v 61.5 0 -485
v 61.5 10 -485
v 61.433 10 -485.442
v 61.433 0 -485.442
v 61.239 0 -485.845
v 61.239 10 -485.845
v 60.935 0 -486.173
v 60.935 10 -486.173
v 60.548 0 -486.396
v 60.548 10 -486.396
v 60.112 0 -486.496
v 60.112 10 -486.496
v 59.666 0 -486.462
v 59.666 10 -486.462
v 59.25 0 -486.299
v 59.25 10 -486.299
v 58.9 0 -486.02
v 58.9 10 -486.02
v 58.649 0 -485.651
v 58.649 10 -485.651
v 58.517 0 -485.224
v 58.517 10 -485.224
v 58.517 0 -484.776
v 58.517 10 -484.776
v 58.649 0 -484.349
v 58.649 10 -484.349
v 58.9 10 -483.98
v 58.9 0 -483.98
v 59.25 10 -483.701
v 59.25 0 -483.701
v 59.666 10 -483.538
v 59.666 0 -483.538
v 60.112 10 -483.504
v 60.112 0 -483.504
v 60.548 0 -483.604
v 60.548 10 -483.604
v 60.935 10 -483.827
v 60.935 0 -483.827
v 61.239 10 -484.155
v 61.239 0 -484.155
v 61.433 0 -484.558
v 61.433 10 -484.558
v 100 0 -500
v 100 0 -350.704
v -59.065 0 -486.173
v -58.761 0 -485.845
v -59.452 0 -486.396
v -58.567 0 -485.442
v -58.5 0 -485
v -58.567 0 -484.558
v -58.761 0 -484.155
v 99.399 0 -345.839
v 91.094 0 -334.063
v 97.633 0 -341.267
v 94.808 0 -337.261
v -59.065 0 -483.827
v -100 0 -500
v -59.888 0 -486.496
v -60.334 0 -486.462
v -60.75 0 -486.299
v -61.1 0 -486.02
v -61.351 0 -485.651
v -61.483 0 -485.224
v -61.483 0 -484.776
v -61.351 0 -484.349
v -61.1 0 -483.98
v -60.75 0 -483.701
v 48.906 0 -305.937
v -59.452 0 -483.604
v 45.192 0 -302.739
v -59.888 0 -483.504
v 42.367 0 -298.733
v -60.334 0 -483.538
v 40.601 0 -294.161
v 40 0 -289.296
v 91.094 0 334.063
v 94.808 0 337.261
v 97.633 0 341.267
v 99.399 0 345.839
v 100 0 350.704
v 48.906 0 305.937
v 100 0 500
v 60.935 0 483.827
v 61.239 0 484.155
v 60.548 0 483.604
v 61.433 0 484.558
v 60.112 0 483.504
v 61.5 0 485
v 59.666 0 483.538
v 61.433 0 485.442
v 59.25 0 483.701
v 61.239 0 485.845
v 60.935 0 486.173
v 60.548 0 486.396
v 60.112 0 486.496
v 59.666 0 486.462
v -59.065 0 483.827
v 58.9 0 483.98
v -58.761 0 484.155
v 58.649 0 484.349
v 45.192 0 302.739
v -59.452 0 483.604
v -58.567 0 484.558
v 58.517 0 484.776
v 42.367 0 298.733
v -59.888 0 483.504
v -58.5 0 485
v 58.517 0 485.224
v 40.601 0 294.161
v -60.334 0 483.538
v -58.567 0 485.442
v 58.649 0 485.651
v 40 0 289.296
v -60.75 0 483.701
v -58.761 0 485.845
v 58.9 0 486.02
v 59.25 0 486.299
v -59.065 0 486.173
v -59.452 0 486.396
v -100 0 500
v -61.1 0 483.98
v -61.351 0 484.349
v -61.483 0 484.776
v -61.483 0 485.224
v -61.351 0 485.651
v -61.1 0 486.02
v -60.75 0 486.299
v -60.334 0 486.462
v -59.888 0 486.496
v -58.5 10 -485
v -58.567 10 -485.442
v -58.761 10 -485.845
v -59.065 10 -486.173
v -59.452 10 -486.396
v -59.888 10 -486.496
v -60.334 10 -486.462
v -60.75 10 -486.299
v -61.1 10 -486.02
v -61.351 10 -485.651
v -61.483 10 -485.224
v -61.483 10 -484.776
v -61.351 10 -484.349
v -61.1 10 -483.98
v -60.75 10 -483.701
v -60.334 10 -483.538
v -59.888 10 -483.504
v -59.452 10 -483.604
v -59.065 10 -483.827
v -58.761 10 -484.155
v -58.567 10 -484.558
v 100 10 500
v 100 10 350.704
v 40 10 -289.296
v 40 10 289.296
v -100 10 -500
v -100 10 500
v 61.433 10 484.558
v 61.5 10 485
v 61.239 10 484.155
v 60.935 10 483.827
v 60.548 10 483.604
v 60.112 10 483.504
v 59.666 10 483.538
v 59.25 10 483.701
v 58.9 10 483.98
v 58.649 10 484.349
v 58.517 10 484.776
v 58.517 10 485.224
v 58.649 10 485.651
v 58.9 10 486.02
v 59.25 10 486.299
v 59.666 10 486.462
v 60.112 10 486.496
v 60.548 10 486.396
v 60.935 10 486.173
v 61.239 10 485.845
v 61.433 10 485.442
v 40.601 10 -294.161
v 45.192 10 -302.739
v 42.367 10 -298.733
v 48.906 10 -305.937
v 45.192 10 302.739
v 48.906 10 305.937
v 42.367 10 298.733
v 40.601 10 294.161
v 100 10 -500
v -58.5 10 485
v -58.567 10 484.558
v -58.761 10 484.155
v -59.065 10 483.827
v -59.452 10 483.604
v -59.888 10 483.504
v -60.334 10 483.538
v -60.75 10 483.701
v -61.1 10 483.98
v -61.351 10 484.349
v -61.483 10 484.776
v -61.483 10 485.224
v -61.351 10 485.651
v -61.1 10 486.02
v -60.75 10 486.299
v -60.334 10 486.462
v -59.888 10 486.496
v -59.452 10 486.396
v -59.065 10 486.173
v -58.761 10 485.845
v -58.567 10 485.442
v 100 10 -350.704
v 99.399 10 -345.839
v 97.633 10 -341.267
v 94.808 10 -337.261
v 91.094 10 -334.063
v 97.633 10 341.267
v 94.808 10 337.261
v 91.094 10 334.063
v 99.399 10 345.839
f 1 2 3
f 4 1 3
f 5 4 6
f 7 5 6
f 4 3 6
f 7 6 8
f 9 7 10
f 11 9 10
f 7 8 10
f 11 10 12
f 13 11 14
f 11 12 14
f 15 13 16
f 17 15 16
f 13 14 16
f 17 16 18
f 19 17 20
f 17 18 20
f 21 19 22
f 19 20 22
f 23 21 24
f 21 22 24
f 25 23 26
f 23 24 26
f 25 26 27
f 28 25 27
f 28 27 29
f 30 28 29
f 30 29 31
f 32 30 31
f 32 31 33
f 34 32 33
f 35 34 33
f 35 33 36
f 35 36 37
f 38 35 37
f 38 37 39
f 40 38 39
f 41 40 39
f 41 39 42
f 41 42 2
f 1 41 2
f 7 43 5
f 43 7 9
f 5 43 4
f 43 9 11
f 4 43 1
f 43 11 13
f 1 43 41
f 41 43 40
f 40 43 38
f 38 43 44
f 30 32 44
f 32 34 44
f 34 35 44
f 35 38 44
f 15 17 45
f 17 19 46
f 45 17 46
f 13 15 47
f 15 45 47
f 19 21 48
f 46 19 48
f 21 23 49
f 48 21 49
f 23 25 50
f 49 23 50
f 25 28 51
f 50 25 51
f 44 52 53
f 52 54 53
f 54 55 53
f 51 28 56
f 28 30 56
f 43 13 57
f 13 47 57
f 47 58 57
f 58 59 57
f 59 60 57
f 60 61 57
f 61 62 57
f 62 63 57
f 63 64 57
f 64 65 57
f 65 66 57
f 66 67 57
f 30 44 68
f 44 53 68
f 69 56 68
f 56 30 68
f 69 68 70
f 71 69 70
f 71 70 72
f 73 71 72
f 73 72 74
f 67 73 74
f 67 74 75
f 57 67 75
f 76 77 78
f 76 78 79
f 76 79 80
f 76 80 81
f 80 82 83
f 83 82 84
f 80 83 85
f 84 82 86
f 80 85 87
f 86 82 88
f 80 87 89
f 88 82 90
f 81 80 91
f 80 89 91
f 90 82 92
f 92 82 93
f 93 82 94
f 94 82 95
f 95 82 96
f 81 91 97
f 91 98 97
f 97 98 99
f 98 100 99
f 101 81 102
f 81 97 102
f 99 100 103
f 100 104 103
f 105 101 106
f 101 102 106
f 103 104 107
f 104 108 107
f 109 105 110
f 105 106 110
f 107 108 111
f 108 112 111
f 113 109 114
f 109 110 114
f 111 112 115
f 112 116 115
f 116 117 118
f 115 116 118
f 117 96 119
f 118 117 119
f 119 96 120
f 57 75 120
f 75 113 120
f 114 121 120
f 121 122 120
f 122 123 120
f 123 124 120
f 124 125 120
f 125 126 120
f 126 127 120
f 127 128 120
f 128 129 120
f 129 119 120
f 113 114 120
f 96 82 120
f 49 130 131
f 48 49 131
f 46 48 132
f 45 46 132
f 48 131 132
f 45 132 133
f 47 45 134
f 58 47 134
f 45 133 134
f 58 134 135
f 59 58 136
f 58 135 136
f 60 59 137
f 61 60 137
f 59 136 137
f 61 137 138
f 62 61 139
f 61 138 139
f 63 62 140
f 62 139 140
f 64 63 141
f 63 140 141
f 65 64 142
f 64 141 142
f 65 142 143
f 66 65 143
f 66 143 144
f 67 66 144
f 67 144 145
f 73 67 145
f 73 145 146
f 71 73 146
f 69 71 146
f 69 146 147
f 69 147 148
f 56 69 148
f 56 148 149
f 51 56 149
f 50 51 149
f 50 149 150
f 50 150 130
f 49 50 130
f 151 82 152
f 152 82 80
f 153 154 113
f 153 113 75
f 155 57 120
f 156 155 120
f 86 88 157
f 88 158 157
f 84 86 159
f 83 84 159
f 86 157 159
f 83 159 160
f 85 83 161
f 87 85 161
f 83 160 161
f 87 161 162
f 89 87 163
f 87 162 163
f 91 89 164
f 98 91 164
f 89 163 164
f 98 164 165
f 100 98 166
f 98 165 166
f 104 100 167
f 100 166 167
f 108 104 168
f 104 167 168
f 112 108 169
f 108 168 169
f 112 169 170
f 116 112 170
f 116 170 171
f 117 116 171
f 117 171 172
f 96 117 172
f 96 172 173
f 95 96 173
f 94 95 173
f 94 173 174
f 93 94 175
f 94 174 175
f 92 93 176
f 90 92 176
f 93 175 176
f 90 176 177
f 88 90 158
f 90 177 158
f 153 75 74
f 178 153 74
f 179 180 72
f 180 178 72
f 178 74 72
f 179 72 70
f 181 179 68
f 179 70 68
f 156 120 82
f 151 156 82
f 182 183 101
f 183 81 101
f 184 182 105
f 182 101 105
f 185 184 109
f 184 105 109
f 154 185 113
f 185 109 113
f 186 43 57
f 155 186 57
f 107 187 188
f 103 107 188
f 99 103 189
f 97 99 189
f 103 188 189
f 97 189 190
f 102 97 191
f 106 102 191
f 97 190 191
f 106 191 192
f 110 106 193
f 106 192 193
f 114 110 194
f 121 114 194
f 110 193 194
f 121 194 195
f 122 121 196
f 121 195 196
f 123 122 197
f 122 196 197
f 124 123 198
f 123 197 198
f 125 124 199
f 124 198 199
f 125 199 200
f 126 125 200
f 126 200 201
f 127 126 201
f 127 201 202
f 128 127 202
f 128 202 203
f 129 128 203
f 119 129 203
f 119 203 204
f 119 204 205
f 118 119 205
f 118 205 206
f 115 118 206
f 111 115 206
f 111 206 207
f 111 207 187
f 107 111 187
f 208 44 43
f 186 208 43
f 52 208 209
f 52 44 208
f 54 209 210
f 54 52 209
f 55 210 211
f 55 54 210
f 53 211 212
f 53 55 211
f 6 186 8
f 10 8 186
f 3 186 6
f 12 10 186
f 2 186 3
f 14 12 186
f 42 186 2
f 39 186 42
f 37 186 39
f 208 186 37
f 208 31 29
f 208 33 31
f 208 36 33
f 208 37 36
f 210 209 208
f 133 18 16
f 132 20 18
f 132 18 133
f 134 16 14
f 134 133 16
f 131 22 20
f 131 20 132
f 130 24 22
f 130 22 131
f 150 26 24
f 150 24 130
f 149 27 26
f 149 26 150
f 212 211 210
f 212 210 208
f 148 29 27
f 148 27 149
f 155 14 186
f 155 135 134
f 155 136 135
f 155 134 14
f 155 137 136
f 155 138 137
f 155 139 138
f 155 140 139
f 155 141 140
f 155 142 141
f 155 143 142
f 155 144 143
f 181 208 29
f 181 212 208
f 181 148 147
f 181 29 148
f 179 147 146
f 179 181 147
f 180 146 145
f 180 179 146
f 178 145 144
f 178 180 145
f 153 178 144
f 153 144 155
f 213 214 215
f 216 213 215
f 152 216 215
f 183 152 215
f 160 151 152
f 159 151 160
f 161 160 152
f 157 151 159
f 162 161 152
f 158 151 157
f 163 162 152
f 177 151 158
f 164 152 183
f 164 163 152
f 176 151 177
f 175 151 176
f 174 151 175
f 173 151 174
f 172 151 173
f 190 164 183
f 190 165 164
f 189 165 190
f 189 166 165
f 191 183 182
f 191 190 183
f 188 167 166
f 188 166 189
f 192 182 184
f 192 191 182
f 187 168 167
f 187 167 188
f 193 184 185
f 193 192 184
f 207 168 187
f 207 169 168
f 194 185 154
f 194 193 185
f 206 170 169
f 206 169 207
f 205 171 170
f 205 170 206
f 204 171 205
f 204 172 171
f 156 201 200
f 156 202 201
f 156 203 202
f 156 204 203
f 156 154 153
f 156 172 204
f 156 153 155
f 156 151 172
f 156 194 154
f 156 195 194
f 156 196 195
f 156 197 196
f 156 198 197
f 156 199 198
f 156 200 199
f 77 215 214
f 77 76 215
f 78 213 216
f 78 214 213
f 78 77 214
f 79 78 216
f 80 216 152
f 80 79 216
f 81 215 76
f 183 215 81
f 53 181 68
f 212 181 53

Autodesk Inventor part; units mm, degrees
ref_plane "YZ Plane" through (0, 0, 0) normal (1, 0, 0) x (0, 1, 0)
ref_plane "XZ Plane" through (0, 0, 0) normal (0, 1, 0) x (-1, 0, 0)
ref_plane "XY Plane" through (0, 0, 0) normal (0, 0, 1) x (1, 0, 0)
sketch "Esquisse1" plane through (0, 0, 0) normal (0, 1, 0) x (-1, 0, 0)
  line L0 (100, 500) -> (-100, 500)
  line L1 (-100, 500) -> (-100, -500)
  line L2 (-100, -500) -> (100, -500)
  line L3 (100, -500) -> (100, 500)
  point P0 (0, 0)
  dimension "d0" = 1000
  dimension "d1" = 200
  dimension "d4" = 500
  dimension "d5" = 100
extrude "Extrusion1" add sketch "Esquisse1" along normal blind 10
sketch "Esquisse2" plane through (0, 10, 0) normal (0, 1, 0) x (1, 0, 0)
  line L0 (100, -500) -> (100, 500) projected
  line L1 (100, -340) -> (40, -300)
  line L2 (40, -300) -> (40, 300)
  line L3 (40, 300) -> (100, 340)
  line L4 (-100, 500) -> (-100, -500) projected
  point P0 (0, 0)
  dimension "d6" = 600
  dimension "d7" = 300
  dimension "d8" = 140
  dimension "d9" = 160
  dimension "d10" = 160
extrude "Extrusion2" cut sketch "Esquisse2" against normal through all
fillet "Congé1" radius 20 4 edges at (40, 5, 300) (100, 5, 340) (40, 5, -300) (100, 5, -340)
sketch "Esquisse3" plane through (0, 10, 0) normal (0, 1, 0) x (1, 0, 0)
  circle A0 centre (-60, -485) radius 1.5
  circle A1 centre (60, -485) radius 1.5
  circle A2 centre (-60, 485) radius 1.5
  circle A3 centre (60, 485) radius 1.5
  line L0 (-100, -500) -> (100, -500) projected
  line L1 (100, 500) -> (-100, 500) projected
  line L2 (-100, 500) -> (-100, -500) projected
  line L3 (100, -500) -> (100, -350.7037) projected
  line L4 (100, 350.7037) -> (100, 500) projected
  point P0 (0, 0)
  dimension "d14" = 3
  dimension "d15" = 3
  dimension "d16" = 3
  dimension "d17" = 3
  dimension "d18" = 15
  dimension "d19" = 15
  dimension "d20" = 15
  dimension "d21" = 15
  dimension "d22" = 40
  dimension "d23" = 40
  dimension "d24" = 40
  dimension "d25" = 40
extrude "Extrusion3" cut sketch "Esquisse3" against normal through all
equation "\"d4\" = 0.5 * d0"
equation "\"d5\" = 0.5 * d1"
equation "\"d7\" = 0.5 * d6"
equation "\"d10\" = d9"
equation "\"d15\" = d14"
equation "\"d16\" = d14"
equation "\"d17\" = d14"
equation "\"d19\" = d18"
equation "\"d20\" = d18"
equation "\"d21\" = d18"
equation "\"d23\" = d22"
equation "\"d24\" = d22"
equation "\"d25\" = d22"
properties part number "Coté long plateau" material "Bois (bouleau)"
